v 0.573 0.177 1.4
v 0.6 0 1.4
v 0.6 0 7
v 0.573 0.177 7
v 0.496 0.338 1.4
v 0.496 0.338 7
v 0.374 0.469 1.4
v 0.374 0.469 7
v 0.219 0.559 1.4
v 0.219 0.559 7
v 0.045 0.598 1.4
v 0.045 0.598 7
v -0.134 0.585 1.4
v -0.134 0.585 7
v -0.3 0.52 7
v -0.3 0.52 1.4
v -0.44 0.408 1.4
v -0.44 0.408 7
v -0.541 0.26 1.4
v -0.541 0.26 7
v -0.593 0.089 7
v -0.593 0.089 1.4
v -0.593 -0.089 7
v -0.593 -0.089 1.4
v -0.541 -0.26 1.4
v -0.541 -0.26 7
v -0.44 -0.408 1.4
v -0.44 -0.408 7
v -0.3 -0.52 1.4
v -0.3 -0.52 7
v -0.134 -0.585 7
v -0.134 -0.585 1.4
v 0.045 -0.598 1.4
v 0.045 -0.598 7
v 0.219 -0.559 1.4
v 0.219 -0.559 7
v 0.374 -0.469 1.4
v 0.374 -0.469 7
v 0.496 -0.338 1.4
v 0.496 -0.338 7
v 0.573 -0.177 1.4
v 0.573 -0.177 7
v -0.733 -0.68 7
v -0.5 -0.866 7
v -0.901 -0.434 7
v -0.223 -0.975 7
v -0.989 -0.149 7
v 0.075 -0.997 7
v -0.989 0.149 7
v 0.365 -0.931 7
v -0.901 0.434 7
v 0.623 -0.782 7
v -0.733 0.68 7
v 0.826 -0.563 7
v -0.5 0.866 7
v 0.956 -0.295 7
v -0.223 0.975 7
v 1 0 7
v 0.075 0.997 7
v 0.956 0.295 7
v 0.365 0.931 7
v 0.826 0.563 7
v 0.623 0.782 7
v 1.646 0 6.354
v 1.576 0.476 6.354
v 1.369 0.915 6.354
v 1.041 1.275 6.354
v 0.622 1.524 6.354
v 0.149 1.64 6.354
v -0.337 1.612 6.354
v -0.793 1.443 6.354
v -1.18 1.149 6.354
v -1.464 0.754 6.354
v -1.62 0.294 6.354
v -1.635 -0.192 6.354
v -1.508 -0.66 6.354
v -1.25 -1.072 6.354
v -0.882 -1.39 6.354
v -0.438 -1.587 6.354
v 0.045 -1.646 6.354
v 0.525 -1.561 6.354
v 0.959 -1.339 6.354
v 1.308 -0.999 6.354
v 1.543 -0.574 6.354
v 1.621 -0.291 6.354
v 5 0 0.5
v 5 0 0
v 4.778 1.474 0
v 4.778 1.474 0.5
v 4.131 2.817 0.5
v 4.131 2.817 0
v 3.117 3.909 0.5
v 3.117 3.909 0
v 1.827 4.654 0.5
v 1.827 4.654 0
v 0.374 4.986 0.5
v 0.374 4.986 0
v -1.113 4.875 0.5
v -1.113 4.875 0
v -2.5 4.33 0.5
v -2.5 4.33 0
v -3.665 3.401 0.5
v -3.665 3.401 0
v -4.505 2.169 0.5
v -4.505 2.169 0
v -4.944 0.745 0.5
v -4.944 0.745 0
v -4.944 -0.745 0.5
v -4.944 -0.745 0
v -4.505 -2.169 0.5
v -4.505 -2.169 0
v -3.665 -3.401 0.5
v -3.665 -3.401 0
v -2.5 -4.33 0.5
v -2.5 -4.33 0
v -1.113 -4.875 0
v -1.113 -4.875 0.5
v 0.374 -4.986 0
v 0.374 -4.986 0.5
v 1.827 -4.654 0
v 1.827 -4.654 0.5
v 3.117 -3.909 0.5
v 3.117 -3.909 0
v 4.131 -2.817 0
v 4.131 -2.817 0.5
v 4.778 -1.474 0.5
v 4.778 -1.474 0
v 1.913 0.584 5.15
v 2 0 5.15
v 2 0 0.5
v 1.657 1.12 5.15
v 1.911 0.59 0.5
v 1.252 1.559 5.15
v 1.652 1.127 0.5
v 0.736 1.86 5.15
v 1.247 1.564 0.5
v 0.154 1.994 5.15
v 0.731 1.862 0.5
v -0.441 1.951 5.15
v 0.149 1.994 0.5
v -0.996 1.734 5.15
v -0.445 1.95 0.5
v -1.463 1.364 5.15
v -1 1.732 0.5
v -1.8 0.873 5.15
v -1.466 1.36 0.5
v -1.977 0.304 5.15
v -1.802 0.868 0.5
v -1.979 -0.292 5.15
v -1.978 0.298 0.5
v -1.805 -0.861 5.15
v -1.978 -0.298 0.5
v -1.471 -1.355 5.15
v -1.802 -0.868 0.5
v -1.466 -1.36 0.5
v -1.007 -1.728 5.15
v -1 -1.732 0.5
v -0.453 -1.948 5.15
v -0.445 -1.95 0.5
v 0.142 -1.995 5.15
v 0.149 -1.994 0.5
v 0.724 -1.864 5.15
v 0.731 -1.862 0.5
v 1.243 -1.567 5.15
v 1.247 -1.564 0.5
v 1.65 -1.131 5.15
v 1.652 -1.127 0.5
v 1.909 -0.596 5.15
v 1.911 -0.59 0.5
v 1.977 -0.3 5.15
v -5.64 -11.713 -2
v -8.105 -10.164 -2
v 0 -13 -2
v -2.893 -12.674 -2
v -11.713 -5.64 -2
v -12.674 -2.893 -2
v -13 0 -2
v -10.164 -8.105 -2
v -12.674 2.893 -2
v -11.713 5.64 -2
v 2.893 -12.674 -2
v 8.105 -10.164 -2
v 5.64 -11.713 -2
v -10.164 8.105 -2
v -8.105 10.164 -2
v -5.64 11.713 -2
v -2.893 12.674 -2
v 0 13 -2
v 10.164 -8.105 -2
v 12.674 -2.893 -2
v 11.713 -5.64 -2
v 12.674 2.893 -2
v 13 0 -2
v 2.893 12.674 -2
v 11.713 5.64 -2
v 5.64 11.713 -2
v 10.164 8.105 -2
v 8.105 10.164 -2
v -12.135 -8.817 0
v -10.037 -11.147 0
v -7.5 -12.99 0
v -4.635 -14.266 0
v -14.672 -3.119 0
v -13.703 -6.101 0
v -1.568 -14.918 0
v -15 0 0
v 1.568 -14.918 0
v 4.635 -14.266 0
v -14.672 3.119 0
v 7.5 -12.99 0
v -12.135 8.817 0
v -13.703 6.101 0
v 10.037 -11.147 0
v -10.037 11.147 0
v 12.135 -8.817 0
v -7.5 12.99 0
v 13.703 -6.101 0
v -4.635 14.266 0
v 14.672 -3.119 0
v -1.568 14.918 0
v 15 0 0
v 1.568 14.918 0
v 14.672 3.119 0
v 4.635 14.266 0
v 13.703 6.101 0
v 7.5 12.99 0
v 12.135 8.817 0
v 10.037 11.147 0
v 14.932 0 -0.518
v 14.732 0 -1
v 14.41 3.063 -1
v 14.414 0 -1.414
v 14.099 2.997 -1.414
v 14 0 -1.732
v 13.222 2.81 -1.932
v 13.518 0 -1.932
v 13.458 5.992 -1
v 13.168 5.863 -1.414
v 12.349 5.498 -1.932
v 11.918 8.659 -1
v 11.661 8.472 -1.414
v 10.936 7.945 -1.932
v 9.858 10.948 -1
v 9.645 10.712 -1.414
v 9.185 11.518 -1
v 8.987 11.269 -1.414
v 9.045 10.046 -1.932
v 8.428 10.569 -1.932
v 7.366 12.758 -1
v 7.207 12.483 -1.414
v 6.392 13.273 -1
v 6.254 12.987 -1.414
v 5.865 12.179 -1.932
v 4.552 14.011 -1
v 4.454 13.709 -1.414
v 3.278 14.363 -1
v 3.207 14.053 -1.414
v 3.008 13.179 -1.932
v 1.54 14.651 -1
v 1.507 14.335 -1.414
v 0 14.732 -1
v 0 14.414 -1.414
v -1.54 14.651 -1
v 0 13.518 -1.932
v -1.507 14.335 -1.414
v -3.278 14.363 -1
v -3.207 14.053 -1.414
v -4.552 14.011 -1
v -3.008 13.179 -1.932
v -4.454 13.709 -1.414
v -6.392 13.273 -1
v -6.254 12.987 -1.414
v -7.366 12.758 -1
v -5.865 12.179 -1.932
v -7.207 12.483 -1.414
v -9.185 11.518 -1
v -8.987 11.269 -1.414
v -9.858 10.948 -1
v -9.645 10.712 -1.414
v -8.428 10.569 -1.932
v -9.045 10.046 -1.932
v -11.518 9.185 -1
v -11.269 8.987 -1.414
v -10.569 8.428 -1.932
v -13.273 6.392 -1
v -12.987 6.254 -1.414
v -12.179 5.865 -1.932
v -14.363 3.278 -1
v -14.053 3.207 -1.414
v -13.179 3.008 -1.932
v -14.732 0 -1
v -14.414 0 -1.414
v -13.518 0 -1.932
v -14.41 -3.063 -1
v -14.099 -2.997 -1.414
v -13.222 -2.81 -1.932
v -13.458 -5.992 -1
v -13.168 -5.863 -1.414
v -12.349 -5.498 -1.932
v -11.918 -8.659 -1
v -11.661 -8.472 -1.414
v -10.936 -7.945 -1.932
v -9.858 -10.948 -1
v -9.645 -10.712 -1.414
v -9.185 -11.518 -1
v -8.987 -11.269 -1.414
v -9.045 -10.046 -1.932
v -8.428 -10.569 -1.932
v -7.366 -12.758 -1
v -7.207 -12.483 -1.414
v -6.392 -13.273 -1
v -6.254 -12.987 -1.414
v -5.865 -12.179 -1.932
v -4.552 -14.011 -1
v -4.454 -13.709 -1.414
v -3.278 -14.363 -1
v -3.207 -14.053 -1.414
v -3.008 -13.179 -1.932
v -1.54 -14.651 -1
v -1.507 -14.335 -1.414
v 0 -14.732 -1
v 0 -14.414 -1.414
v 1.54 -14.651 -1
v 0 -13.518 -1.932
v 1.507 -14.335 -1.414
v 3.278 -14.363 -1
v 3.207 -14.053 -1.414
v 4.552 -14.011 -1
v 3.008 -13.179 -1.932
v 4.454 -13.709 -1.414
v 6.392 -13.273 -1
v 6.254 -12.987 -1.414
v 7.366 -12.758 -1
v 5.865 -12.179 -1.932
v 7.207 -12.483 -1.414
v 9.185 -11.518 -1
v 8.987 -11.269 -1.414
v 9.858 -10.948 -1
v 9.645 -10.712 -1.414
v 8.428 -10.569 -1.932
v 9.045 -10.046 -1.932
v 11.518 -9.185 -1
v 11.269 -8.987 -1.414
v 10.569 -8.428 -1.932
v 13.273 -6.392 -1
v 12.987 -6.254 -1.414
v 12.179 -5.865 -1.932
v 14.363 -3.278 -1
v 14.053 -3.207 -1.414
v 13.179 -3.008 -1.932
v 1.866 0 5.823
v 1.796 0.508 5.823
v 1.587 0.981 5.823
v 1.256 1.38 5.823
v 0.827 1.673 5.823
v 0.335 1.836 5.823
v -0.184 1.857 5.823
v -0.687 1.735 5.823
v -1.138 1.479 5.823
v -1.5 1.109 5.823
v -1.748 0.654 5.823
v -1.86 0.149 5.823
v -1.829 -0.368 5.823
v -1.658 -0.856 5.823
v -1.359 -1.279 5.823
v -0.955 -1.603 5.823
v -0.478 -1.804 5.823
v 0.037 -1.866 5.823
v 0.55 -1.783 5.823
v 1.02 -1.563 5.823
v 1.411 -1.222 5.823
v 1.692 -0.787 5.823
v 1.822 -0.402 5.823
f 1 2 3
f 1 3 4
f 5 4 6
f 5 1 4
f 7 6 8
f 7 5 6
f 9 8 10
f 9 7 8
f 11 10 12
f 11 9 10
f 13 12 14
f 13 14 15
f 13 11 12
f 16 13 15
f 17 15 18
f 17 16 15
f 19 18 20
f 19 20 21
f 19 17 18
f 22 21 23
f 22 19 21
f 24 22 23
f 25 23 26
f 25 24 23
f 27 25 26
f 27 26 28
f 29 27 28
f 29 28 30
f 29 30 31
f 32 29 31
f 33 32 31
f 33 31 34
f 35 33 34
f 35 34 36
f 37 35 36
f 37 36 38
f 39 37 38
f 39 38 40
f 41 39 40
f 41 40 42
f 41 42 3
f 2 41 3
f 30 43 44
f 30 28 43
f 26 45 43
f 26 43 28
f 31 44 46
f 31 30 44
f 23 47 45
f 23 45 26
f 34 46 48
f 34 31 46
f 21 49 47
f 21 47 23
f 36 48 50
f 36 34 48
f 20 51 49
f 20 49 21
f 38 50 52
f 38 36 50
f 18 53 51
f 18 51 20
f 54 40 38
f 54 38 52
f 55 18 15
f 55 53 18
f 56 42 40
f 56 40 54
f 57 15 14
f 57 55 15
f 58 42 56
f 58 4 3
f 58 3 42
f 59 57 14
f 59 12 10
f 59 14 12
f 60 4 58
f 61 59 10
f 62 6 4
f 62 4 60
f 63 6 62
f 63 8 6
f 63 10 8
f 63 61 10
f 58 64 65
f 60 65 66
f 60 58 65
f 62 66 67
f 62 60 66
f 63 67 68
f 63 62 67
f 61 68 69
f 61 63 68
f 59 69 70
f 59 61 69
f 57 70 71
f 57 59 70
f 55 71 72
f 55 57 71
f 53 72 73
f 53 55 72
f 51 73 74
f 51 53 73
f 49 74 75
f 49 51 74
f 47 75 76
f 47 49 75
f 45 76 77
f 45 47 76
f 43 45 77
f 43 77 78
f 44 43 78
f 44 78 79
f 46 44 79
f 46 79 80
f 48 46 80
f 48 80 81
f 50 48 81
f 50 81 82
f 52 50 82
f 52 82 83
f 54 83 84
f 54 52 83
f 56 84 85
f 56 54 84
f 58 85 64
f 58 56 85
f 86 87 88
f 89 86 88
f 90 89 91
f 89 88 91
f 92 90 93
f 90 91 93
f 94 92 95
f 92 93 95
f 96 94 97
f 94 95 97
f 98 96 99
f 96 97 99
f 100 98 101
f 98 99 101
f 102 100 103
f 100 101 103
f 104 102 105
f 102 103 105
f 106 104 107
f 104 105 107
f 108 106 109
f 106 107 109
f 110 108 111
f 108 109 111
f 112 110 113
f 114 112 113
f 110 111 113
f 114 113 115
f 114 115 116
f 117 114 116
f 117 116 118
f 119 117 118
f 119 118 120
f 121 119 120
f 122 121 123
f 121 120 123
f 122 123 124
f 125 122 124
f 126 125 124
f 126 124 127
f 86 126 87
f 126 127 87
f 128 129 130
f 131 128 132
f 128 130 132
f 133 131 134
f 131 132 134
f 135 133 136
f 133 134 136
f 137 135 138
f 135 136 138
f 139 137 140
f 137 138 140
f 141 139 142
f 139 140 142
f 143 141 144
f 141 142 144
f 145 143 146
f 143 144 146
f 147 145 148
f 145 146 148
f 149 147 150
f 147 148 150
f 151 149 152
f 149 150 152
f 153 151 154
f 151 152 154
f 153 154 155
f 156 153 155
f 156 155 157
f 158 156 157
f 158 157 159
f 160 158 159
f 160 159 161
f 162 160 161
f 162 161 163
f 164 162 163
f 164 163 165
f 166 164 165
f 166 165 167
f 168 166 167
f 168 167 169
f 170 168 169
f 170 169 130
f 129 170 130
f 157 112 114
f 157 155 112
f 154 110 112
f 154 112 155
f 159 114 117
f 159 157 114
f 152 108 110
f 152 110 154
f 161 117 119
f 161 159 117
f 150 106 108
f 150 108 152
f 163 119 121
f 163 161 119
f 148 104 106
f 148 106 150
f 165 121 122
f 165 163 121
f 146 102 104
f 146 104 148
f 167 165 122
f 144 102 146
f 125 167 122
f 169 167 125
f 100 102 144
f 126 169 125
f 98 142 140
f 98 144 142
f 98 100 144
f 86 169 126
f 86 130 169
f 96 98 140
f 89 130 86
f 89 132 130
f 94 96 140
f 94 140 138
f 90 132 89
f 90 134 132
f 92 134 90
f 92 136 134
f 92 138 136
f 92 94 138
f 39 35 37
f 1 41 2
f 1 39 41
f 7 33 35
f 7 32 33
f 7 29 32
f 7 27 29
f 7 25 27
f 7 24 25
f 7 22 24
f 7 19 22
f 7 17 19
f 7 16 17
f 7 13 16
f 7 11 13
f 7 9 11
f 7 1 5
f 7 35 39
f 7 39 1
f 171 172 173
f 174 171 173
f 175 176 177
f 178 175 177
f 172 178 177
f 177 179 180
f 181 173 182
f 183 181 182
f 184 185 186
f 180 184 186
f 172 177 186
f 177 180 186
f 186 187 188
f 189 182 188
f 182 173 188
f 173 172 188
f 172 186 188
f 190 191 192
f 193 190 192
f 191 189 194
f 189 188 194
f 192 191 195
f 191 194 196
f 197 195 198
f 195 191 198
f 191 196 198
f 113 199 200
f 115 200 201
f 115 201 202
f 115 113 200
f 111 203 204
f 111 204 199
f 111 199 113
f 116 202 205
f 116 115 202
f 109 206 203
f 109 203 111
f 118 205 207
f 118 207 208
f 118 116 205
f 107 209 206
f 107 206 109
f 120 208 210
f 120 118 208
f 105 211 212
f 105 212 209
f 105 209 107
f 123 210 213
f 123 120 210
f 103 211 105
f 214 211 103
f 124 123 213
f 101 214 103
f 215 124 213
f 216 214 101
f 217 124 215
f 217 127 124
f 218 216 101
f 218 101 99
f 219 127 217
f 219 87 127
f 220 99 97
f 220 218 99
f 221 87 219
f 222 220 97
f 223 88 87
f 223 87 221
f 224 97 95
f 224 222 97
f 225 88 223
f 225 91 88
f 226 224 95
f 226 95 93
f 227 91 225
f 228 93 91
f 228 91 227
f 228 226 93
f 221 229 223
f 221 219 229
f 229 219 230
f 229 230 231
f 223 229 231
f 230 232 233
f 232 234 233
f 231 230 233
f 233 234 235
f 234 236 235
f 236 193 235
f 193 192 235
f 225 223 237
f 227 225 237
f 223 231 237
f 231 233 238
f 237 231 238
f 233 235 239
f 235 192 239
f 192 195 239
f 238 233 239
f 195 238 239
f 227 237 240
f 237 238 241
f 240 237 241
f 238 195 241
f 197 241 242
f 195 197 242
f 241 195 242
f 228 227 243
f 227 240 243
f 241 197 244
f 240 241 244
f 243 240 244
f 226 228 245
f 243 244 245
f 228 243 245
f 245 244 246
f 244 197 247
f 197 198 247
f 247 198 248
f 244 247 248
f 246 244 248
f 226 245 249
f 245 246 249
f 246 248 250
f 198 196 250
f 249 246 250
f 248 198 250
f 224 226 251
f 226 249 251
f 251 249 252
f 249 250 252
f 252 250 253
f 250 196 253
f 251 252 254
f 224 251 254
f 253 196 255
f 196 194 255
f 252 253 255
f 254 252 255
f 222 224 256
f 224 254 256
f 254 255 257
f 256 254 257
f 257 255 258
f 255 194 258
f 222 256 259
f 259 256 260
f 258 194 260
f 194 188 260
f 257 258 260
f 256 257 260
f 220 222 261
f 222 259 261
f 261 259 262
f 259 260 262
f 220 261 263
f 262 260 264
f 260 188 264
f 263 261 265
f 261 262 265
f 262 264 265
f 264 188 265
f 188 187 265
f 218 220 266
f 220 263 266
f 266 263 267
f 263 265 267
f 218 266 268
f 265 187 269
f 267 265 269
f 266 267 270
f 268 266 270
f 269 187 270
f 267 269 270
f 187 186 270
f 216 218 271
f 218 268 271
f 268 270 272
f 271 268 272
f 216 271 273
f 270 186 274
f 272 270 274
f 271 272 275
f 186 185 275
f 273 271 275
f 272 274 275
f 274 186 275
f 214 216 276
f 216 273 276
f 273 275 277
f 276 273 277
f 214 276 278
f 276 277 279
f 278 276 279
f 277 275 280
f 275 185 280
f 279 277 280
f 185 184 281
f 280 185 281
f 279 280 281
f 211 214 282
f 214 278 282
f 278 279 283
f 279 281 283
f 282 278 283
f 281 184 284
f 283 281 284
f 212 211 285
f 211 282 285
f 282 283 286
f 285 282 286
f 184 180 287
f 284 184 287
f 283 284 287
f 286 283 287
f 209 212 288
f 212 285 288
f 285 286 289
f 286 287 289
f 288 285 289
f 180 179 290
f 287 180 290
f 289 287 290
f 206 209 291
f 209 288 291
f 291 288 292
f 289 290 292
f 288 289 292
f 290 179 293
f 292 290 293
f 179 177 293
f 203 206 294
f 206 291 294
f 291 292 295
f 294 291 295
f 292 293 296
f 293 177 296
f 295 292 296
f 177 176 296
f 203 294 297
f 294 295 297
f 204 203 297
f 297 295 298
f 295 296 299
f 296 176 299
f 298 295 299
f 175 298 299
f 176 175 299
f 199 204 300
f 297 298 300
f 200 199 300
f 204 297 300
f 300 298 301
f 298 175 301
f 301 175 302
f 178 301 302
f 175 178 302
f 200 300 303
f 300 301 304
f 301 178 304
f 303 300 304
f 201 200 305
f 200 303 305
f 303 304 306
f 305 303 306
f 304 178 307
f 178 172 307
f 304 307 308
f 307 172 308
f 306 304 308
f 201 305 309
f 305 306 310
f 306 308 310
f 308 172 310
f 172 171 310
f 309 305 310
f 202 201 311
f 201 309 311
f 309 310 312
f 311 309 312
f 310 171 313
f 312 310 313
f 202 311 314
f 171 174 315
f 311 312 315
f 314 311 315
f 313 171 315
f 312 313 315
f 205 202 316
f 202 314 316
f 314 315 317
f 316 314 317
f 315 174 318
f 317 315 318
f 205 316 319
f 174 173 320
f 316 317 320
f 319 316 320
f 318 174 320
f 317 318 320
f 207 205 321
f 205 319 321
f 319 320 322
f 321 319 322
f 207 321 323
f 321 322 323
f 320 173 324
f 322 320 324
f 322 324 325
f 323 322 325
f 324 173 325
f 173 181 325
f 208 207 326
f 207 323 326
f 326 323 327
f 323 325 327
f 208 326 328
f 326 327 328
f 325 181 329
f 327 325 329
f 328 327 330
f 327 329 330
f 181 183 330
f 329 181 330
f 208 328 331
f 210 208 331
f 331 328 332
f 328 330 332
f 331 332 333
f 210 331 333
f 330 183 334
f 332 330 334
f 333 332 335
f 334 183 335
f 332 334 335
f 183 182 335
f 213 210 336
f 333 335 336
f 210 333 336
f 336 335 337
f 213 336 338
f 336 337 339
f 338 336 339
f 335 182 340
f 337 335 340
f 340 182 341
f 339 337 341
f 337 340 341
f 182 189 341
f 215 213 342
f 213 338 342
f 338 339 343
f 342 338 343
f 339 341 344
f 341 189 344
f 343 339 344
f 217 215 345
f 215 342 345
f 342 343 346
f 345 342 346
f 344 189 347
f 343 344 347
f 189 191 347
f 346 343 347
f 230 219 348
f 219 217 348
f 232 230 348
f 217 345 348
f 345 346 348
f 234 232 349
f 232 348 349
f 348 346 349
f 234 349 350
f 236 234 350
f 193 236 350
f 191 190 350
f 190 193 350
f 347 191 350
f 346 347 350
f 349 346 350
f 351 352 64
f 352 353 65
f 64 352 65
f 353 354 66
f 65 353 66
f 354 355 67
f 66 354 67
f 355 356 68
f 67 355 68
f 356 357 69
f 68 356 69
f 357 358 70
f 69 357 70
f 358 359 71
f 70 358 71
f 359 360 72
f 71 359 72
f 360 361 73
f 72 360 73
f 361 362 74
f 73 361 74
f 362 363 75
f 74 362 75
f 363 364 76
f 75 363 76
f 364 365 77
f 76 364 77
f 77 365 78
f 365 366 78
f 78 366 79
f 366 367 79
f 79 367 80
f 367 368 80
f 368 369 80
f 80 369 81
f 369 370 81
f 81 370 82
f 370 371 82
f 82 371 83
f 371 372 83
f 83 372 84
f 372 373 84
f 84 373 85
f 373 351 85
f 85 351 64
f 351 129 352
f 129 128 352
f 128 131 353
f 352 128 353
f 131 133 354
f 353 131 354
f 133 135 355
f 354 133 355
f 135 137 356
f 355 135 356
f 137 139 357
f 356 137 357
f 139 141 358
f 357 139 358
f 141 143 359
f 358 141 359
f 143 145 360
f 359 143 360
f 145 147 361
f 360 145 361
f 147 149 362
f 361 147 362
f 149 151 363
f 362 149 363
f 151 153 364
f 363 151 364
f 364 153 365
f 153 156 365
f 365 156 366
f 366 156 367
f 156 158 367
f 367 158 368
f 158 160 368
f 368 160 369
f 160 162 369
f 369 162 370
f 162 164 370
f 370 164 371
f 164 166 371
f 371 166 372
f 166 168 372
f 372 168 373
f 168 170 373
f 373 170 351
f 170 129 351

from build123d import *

# Parameters (mm, degrees)
F0_R      = 2
F1_DEPTH  = 7
F2_T      = -1.4
F0_R_2    = 15
F3_DEPTH  = 2
F4_R      = 1.99999
F6_SIZE   = 1
F7_SIZE   = 0.5
F8_SIZE   = 0.35
F9_R      = 5
F9_R_2    = 2
F10_DEPTH = 0.5


# Not quite as in the source:
# - a fillet or chamfer is up to 0.001 mm smaller than in the source, because OpenCascade refuses the exact size


with BuildPart() as f1:
    # F0 (on Top) → F1 (new body)
    with BuildSketch(Plane.XY):
        Circle(F0_R)
    extrude(amount=F1_DEPTH)

    # F2
    f2_openings = [f1.faces().sort_by_distance(p)[0] for p in [
        (0, 0, 7),
    ]]
    offset(amount=F2_T, openings=f2_openings)

    # F0 (on Top) → F3 (join)
    with BuildSketch(Plane.XY):
        Circle(F0_R_2)
        Circle(F0_R, mode=Mode.SUBTRACT)
        Circle(F0_R)
    extrude(amount=-F3_DEPTH)

    # F4 (radius 2 in the source; OpenCascade refuses exactly that, so slightly less here)
    f4_edges = [f1.edges().sort_by_distance(p)[0] for p in [
        (-15, 0, -2),
    ]]
    fillet(f4_edges, radius=F4_R)

    # F6
    f6_edges = [f1.edges().sort_by_distance(p)[0] for p in [
        (-2, 0, 7),
    ]]
    chamfer(f6_edges, length=F6_SIZE)

    # F7
    f7_edges = [f1.edges().sort_by_distance(p)[0] for p in [
        (-2, 0, 6),
    ]]
    chamfer(f7_edges, length=F7_SIZE)

    # F8
    f8_edges = [f1.edges().sort_by_distance(p)[0] for p in [
        (-1.999991, 0, 5.5),
    ]]
    chamfer(f8_edges, length=F8_SIZE)

    # F9 (on face) → F10 (join)
    with BuildSketch(Plane.XY):
        Circle(F9_R)
        Circle(F9_R_2, mode=Mode.SUBTRACT)
    extrude(amount=F10_DEPTH)


solid = f1.part
